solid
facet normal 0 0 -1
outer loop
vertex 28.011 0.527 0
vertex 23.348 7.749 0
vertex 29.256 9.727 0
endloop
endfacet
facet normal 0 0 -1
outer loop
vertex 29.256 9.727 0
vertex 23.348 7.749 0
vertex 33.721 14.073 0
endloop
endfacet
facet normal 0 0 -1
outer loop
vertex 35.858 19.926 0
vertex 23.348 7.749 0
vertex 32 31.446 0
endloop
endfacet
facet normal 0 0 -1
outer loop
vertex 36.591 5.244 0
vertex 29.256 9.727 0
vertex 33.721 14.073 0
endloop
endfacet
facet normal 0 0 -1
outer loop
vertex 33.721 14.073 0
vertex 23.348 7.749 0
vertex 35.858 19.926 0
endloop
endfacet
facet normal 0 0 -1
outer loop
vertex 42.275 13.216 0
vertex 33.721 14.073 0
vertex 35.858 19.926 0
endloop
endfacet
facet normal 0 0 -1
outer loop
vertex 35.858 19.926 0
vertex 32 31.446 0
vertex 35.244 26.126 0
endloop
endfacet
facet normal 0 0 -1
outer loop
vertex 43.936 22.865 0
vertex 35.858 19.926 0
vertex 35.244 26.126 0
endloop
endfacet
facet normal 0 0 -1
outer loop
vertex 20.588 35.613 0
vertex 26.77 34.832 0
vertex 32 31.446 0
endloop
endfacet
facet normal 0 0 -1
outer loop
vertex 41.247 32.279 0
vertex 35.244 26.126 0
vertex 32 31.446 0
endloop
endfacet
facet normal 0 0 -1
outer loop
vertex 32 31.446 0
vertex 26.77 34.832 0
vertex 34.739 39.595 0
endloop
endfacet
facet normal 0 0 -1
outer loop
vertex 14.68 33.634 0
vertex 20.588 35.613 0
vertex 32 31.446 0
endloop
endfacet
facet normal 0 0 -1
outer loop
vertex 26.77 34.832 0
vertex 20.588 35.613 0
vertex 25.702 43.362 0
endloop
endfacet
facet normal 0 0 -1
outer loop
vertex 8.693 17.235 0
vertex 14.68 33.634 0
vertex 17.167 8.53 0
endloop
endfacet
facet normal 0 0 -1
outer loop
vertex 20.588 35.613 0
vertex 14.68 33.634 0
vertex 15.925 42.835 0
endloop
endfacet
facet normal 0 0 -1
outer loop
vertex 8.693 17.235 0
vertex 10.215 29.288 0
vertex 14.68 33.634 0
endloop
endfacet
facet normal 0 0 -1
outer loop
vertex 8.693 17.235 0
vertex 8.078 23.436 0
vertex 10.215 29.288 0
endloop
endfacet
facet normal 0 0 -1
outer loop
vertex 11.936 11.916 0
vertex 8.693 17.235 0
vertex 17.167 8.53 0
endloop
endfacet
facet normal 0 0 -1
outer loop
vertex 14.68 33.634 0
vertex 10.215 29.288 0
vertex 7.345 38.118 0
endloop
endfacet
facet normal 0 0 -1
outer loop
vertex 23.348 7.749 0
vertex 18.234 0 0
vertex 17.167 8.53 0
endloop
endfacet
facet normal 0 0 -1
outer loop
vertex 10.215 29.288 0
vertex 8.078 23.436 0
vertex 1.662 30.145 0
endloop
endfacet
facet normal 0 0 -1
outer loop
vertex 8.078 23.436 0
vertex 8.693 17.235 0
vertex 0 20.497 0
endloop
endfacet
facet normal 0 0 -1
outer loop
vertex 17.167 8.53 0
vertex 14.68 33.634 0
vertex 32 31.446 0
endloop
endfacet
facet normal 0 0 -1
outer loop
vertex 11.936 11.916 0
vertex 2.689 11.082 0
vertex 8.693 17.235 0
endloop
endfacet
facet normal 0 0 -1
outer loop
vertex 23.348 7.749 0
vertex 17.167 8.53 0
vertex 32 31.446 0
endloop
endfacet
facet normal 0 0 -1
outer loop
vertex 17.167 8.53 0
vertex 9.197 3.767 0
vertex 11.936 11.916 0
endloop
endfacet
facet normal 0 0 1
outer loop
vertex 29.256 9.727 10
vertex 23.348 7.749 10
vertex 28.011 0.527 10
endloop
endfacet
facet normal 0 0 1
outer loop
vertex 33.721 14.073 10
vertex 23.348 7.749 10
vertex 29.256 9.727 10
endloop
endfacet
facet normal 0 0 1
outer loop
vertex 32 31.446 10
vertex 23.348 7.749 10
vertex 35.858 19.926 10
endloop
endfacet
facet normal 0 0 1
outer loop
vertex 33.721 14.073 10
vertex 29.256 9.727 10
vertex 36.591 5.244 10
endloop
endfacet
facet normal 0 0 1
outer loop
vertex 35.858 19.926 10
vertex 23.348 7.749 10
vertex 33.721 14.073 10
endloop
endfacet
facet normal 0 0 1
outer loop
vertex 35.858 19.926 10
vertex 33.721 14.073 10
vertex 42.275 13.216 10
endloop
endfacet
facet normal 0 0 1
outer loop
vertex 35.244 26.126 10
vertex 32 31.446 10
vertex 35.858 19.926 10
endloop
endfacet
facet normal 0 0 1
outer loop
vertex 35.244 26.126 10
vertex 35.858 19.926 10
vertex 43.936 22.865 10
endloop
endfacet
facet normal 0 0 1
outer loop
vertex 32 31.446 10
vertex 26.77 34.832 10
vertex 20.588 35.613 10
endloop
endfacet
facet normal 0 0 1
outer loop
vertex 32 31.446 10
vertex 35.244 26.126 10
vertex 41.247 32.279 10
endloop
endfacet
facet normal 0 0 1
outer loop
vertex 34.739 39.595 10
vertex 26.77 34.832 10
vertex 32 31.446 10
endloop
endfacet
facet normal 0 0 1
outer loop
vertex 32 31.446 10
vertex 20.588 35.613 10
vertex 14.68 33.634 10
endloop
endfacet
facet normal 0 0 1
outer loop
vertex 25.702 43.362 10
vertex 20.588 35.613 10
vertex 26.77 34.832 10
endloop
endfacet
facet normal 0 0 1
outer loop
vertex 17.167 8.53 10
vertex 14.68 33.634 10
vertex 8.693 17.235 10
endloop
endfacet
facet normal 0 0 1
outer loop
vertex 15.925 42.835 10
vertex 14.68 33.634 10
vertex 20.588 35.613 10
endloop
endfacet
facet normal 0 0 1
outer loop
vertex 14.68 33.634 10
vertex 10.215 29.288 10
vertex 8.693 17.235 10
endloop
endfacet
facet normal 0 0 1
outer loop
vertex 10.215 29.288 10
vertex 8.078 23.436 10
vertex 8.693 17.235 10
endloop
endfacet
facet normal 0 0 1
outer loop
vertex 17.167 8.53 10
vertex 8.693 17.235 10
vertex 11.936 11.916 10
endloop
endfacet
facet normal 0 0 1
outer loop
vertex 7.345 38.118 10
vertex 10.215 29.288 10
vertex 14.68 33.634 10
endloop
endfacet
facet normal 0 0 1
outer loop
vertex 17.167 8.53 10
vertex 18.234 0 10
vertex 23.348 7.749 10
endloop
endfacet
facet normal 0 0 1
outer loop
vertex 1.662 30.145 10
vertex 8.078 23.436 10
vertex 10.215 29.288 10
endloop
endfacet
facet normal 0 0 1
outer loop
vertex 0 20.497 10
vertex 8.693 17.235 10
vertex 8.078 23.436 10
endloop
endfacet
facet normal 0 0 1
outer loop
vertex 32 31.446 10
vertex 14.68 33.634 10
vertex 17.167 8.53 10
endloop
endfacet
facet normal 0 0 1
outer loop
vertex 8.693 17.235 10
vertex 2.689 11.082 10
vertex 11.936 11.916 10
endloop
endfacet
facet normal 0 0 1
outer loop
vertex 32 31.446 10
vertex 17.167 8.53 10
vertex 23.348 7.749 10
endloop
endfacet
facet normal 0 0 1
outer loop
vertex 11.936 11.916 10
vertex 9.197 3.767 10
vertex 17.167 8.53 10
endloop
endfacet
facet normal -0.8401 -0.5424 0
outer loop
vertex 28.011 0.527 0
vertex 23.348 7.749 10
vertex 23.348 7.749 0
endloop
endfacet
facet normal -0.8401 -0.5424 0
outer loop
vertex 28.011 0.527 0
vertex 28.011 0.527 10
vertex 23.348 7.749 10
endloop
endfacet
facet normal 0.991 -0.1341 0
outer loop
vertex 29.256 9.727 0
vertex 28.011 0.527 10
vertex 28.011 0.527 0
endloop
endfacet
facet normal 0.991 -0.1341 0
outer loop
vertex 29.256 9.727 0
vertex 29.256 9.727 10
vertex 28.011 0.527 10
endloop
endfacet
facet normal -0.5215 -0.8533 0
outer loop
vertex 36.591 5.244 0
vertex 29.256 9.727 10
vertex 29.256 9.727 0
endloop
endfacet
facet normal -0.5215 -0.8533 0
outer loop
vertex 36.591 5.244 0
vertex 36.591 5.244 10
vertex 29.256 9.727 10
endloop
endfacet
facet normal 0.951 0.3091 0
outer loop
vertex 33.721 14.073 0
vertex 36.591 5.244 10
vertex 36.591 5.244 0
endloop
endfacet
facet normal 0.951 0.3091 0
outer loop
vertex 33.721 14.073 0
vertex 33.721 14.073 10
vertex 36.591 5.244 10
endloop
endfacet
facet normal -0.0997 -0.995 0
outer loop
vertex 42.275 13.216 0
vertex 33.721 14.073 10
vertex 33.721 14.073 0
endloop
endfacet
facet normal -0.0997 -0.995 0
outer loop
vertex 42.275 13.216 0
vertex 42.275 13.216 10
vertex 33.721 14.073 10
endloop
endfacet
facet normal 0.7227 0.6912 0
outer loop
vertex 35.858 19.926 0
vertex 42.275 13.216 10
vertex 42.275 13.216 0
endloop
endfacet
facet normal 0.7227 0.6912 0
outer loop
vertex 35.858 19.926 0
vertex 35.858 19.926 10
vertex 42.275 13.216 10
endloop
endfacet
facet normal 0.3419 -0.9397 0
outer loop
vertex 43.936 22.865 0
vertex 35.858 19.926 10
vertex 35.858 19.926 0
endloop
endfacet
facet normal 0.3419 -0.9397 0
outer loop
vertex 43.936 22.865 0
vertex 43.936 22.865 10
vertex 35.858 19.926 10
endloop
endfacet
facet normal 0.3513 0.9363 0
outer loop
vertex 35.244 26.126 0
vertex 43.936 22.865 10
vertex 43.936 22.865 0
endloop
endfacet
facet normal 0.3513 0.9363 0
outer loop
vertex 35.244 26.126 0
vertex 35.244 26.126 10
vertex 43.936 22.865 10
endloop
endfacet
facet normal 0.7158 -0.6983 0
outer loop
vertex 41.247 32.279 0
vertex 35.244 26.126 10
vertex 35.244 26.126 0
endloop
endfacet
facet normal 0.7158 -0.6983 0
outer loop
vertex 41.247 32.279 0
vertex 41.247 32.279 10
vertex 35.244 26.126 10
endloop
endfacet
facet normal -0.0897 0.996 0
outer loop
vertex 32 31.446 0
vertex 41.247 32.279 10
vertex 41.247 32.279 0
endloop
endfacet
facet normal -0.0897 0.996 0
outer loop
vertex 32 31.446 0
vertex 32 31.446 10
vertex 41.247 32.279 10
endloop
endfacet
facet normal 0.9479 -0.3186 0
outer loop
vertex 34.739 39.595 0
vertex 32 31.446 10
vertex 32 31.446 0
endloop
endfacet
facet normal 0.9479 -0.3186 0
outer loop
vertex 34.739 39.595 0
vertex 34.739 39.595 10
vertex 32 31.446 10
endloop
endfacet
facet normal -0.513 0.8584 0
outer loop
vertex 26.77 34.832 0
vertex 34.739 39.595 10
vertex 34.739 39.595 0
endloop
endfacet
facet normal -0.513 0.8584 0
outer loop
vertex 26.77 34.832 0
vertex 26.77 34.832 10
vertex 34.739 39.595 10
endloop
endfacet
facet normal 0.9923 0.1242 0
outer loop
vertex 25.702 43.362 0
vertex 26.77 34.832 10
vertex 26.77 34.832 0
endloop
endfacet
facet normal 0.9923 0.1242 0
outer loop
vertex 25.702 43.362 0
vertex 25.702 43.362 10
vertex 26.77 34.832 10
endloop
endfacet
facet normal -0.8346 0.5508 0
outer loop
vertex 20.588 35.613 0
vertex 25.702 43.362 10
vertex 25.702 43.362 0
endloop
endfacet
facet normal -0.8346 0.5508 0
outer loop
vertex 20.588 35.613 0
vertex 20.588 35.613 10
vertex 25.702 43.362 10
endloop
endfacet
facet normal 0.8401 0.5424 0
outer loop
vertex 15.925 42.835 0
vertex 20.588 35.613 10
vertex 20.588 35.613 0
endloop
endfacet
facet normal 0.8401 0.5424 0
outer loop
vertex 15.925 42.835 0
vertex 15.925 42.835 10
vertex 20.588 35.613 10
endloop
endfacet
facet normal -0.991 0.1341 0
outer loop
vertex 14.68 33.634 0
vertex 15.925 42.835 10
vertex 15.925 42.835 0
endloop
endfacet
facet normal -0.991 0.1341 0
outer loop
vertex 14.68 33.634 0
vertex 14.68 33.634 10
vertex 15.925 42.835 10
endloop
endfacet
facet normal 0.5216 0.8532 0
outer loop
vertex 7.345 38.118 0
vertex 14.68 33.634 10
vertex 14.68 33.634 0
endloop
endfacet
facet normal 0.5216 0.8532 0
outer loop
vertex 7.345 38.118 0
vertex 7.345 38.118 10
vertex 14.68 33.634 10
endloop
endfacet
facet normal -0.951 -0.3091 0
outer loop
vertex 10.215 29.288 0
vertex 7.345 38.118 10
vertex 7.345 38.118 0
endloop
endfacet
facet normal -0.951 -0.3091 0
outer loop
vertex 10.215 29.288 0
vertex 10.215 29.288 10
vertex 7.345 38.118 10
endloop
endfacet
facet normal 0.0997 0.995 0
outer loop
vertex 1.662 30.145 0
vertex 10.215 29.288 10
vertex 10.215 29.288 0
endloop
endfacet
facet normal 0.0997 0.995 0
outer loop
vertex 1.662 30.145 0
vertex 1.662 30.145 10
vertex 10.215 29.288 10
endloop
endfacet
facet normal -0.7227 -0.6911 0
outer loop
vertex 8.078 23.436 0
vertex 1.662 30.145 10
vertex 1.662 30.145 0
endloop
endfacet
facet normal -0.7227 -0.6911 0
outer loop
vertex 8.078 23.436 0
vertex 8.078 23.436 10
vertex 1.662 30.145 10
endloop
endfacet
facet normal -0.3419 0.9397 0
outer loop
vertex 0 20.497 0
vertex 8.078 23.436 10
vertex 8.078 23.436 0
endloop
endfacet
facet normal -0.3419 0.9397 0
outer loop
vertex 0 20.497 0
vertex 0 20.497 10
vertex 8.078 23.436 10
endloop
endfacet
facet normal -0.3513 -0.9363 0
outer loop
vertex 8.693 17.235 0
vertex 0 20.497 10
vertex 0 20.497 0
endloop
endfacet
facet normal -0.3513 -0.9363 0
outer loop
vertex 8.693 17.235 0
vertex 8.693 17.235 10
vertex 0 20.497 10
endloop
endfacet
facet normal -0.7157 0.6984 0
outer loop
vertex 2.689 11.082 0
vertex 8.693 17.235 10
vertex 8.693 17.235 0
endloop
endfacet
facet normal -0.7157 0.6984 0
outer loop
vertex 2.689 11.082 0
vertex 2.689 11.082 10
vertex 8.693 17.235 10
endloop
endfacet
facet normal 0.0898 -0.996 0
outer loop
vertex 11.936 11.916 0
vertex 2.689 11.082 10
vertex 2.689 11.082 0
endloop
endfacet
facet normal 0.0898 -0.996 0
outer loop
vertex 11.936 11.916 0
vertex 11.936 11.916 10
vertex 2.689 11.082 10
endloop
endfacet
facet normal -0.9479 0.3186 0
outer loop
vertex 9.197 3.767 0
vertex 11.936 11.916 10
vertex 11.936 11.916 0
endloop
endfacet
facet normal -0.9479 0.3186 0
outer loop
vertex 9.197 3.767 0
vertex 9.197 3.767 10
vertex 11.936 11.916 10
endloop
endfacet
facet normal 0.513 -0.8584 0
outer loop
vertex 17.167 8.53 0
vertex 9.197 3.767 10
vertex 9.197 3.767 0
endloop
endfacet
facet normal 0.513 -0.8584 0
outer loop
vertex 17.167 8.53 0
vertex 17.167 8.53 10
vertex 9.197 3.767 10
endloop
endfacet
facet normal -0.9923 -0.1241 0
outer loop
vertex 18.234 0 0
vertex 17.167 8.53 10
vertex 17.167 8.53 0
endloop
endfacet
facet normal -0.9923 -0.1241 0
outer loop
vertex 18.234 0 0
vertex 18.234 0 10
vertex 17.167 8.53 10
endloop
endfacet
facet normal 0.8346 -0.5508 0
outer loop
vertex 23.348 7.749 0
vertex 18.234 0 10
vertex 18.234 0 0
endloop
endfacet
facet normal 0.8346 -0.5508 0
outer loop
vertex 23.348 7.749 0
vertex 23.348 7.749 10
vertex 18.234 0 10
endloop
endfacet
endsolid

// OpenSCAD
$fn = 32;

// ----------------------------------------------------------------------
// Chain sprocket: 14 teeth, 14 mm root radius
// ----------------------------------------------------------------------

// --- parameters (mm) ---
profile_height = 10;      // extrusion height
profile_points = 28;      // points of the closed outline

profile = [[35.858, 19.926], [43.936, 22.865], [35.244, 26.126], [41.247, 32.279], [32, 31.446], [34.739, 39.595], [26.77, 34.832], [25.702, 43.362], [20.588, 35.613], [15.925, 42.835], [14.68, 33.634], [7.345, 38.118], [10.215, 29.288], [1.662, 30.145], [8.078, 23.436], [0, 20.497], [8.693, 17.235], [2.689, 11.082], [11.936, 11.916], [9.197, 3.767], [17.167, 8.53], [18.234, 0], [23.348, 7.749], [28.011, 0.527], [29.256, 9.727], [36.591, 5.244], [33.721, 14.073], [42.275, 13.216]];  // single closed polygon, 28 points, counter clockwise

// --- the one profile operation ---
linear_extrude(height = profile_height) polygon(points = profile);
